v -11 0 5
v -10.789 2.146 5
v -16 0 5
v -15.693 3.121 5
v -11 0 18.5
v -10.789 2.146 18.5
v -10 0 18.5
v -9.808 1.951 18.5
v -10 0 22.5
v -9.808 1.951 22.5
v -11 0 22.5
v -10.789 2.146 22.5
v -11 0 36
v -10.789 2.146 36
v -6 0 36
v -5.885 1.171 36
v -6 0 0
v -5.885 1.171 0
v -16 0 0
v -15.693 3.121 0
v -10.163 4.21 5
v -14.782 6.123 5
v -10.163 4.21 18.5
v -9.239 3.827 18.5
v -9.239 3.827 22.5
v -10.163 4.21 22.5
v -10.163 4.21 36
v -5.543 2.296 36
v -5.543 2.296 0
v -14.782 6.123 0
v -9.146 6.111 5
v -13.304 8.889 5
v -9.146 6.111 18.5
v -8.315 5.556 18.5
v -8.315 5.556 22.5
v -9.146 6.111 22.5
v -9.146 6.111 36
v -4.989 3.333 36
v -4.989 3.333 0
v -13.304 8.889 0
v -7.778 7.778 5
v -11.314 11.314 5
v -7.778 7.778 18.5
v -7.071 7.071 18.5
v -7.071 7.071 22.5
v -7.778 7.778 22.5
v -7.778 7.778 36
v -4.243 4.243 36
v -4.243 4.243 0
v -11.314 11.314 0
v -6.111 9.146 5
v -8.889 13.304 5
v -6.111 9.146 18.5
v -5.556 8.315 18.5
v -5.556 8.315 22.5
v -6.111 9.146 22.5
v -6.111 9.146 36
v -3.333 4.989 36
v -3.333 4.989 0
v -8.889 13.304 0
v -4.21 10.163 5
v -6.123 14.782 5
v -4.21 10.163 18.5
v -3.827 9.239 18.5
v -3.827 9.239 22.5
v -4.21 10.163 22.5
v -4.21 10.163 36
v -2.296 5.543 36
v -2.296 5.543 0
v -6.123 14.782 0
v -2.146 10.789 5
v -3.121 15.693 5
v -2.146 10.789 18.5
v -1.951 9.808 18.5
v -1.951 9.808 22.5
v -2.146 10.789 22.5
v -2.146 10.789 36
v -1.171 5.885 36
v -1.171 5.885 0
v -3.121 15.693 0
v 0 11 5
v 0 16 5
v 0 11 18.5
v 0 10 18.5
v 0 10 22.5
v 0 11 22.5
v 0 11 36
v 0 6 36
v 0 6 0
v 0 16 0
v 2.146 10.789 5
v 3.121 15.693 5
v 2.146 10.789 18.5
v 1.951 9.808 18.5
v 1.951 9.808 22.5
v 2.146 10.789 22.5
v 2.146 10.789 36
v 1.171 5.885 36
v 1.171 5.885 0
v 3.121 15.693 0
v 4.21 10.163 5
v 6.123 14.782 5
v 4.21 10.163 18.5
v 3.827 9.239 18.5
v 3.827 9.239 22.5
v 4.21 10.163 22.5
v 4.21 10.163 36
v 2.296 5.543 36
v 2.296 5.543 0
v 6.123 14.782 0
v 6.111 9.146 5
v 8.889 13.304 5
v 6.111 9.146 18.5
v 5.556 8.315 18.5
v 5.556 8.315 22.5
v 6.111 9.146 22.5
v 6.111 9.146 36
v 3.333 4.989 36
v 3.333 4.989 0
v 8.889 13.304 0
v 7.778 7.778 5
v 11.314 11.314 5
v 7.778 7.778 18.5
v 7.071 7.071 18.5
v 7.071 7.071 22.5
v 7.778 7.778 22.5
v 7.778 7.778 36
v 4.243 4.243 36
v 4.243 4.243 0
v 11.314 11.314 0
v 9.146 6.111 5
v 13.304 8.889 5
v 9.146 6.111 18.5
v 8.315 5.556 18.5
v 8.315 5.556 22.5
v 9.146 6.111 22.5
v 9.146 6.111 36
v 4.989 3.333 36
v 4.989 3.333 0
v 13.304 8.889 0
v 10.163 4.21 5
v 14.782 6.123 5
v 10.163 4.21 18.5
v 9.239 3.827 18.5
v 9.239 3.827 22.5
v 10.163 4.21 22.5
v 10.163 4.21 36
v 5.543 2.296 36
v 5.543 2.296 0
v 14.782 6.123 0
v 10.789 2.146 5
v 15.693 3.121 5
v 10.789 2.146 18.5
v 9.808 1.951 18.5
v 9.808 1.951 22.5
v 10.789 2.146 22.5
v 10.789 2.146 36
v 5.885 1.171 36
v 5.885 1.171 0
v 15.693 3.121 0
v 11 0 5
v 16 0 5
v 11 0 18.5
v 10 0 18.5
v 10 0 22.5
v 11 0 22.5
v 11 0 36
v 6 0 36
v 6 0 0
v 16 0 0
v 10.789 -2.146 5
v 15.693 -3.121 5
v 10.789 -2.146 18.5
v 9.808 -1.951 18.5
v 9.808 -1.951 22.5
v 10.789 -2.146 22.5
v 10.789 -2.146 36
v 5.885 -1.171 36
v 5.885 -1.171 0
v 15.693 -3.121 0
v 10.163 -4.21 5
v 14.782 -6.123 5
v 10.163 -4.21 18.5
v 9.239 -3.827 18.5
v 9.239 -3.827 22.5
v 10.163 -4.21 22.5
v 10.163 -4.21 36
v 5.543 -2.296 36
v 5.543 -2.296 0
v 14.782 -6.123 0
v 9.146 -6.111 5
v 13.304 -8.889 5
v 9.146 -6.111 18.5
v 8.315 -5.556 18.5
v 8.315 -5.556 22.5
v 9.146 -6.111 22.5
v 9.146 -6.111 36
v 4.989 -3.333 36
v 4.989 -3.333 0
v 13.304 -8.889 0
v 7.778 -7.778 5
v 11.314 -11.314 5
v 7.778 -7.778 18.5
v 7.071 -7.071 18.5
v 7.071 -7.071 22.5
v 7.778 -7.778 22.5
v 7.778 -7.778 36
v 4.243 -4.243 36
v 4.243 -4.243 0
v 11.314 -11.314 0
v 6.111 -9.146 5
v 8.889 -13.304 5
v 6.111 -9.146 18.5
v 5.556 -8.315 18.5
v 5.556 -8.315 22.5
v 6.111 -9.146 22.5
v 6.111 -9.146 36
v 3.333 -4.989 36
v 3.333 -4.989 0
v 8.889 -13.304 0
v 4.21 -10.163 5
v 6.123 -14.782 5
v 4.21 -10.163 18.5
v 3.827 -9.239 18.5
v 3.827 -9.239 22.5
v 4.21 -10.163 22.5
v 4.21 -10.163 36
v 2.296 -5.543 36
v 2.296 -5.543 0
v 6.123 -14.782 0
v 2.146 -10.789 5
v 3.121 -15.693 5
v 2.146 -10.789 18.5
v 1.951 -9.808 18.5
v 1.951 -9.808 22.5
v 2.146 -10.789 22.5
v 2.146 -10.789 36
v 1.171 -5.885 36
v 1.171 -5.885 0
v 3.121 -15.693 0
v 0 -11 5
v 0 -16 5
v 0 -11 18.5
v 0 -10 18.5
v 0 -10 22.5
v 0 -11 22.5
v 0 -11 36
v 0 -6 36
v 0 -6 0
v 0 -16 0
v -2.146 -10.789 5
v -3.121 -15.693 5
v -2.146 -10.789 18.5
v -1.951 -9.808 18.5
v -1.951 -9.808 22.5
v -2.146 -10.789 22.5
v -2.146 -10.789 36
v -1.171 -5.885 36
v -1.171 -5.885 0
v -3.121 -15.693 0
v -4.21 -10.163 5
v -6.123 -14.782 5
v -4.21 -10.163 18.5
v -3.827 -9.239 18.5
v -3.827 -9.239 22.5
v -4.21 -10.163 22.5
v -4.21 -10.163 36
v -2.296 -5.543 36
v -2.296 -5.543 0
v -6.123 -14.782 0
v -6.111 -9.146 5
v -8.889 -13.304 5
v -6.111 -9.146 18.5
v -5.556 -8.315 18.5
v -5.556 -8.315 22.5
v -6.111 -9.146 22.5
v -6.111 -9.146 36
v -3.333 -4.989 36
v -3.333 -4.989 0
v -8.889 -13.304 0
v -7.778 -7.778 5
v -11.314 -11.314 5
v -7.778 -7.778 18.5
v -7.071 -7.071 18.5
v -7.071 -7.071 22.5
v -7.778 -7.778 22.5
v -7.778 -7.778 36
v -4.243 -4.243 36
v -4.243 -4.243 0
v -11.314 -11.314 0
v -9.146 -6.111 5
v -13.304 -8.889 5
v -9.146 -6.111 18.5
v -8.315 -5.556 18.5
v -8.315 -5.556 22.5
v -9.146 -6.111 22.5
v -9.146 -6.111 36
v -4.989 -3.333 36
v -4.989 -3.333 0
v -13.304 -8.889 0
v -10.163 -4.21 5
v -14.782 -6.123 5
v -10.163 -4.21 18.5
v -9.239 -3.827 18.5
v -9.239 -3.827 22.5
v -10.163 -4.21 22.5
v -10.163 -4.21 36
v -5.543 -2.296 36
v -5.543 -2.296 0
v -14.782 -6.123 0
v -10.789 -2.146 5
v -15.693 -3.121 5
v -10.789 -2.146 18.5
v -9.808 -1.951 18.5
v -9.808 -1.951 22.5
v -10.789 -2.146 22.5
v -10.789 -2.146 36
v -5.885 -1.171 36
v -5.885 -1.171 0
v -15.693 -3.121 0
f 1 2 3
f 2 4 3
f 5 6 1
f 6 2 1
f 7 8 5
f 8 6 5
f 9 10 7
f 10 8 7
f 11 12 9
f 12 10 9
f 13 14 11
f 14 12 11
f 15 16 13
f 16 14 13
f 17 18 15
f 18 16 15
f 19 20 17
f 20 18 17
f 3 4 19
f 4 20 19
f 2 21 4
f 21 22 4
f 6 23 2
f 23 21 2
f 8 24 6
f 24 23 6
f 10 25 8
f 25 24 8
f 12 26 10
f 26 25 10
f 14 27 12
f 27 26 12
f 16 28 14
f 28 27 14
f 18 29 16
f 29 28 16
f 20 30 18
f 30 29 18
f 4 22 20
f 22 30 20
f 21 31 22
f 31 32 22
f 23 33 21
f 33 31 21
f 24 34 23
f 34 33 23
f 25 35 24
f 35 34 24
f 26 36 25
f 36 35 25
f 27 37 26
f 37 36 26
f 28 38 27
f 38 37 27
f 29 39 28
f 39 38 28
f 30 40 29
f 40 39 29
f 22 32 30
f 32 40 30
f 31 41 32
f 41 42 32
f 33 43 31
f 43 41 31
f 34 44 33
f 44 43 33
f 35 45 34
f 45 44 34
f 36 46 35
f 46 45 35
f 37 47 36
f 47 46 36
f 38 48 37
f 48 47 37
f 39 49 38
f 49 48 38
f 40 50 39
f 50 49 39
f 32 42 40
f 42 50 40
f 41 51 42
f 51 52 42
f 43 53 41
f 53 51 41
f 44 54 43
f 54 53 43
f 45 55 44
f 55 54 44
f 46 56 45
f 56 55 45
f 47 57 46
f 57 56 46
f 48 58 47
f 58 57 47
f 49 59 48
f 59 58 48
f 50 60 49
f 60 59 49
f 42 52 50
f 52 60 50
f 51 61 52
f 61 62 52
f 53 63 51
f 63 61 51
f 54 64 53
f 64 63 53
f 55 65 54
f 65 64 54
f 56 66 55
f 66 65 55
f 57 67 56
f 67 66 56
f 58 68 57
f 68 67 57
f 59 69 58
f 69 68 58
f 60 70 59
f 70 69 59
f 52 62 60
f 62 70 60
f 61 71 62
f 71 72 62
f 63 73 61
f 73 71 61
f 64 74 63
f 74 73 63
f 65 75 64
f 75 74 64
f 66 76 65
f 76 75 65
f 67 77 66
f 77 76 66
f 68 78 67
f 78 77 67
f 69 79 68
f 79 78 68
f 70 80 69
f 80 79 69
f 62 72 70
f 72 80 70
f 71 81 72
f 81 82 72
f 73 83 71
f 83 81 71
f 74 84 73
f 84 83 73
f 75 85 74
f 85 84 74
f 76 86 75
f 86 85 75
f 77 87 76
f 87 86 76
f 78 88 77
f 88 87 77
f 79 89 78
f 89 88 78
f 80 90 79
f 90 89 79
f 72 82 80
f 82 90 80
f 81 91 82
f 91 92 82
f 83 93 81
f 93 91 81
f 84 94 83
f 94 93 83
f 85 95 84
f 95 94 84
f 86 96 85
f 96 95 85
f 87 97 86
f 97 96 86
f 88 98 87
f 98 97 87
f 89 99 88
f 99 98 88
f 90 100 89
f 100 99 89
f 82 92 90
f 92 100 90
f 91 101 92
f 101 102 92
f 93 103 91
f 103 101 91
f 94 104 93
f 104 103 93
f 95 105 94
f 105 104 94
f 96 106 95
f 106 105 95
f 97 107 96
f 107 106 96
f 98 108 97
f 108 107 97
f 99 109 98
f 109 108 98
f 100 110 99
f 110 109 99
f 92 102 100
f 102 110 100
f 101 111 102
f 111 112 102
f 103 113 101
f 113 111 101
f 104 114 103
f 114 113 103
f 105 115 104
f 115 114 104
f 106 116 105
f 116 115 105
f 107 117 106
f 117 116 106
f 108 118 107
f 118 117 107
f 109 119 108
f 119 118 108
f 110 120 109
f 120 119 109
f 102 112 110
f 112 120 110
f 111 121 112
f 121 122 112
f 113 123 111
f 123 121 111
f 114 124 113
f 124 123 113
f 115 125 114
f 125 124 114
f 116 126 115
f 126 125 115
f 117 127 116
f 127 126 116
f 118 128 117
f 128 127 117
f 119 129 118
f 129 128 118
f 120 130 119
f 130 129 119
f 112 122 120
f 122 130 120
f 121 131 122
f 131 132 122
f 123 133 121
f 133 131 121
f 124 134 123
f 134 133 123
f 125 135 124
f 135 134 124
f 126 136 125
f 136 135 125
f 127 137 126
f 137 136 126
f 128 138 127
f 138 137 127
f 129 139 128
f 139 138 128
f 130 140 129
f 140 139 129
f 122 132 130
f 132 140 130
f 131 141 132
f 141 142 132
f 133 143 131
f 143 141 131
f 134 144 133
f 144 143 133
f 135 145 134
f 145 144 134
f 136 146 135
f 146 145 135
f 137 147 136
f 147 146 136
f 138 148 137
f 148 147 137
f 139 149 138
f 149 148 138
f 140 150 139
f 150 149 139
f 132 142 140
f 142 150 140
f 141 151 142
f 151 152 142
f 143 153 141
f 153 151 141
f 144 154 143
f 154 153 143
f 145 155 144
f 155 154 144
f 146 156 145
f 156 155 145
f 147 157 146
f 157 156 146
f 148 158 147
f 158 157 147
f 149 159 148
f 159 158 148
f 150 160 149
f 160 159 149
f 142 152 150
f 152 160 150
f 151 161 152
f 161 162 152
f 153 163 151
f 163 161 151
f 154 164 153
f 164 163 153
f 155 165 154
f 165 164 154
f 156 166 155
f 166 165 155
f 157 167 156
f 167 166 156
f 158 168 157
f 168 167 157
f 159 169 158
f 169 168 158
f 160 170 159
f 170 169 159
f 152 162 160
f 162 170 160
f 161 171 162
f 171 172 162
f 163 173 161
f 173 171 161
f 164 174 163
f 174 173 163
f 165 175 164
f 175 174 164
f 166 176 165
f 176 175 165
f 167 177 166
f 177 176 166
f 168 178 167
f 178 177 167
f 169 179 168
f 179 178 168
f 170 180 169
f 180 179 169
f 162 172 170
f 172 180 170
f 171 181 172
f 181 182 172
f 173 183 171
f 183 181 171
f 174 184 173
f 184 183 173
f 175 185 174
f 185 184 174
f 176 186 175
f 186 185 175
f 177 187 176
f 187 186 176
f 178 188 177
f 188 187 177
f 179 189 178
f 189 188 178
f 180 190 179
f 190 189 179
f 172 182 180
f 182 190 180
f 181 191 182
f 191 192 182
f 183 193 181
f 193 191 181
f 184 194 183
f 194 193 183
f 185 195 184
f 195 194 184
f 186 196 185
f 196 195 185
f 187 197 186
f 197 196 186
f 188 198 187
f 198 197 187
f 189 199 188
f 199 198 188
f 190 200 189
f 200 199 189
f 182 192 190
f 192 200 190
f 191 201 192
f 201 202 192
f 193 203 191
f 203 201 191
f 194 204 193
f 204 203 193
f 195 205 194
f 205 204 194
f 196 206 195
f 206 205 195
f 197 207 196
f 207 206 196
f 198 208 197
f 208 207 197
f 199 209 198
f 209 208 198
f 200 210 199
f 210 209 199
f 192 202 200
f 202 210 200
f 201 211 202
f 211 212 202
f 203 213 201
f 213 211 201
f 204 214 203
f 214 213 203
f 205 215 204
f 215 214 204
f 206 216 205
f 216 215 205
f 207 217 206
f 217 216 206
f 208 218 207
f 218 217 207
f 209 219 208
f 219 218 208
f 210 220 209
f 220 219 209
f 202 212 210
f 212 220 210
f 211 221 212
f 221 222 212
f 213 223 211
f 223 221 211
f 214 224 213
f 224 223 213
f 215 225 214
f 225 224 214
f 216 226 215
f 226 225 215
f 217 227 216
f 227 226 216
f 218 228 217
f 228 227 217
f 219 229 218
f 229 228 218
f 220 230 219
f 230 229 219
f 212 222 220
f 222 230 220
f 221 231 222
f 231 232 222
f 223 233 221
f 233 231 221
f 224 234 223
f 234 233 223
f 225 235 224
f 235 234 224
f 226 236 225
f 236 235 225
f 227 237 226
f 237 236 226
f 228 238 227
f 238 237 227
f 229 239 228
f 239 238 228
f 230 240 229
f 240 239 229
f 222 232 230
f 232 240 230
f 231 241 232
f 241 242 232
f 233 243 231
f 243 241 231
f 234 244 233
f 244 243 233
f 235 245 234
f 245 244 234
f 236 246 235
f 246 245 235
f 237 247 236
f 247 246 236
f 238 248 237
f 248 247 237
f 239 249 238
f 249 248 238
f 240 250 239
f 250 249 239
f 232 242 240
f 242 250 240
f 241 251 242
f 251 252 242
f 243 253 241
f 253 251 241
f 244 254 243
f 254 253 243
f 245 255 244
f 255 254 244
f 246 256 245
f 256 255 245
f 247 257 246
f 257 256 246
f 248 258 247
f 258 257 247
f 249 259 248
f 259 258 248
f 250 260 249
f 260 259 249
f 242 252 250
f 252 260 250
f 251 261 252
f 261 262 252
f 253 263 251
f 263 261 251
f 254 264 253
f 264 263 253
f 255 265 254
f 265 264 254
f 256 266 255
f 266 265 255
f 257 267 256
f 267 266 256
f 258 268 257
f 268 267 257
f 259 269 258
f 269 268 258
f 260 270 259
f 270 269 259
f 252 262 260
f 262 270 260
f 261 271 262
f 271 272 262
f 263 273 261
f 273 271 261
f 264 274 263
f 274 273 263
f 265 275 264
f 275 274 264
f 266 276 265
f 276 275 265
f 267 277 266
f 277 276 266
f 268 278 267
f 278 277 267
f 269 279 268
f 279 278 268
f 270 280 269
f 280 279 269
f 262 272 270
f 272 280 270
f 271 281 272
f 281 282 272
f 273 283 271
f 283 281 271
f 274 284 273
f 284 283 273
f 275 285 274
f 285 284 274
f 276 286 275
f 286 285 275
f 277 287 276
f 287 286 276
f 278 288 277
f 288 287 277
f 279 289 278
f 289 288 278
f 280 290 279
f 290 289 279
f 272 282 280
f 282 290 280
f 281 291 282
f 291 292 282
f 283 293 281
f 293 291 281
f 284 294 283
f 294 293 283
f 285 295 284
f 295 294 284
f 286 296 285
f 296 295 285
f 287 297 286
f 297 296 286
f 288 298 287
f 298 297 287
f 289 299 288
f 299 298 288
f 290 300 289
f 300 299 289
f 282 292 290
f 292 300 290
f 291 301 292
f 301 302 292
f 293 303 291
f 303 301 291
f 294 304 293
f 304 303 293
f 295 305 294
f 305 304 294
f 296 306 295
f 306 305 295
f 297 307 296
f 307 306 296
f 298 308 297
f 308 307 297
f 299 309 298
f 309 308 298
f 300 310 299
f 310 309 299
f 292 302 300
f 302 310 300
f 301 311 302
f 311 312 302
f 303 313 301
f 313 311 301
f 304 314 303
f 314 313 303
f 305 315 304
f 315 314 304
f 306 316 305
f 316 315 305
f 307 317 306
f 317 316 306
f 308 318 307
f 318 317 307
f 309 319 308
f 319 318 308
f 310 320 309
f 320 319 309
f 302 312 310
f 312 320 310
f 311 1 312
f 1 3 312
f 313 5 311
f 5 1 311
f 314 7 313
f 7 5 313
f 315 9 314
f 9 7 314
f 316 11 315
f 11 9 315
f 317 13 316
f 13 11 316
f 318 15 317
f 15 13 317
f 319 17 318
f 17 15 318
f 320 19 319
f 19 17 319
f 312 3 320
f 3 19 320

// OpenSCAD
$fn = 32;

// ----------------------------------------------------------------------
// Grooved revolve: flanged, bore R6
// ----------------------------------------------------------------------

// --- parameters (mm) ---
bore_r = 6;               // bore radius
outer_r = 11;             // outer radius of the body
total_h = 36;             // overall height, Z
wall = 5;                 // radial wall thickness
groove_w = 4;             // groove width
groove_d = 1;             // groove depth
grooves = 1;              // number of outer grooves
flange_r = 16;            // flange radius
flange_h = 5;             // flange height

bbox_x = 2 * flange_r;  // full diameter
bore_d = 2 * bore_r;  // bore diameter
body_d = 2 * outer_r;  // body diameter
flange_d = 2 * flange_r;  // flange diameter
revolve_angle = 360;  // full turn around the Z axis

profile = [[6, 0], [11, 0], [16, 0], [16, 5], [11, 5], [11, 18.5], [10, 18.5], [10, 22.5], [11, 22.5], [11, 36], [6, 36]];  // primary outline, 11 points, counter clockwise

// --- the one profile operation ---
rotate_extrude(angle = revolve_angle) polygon(points = profile);
